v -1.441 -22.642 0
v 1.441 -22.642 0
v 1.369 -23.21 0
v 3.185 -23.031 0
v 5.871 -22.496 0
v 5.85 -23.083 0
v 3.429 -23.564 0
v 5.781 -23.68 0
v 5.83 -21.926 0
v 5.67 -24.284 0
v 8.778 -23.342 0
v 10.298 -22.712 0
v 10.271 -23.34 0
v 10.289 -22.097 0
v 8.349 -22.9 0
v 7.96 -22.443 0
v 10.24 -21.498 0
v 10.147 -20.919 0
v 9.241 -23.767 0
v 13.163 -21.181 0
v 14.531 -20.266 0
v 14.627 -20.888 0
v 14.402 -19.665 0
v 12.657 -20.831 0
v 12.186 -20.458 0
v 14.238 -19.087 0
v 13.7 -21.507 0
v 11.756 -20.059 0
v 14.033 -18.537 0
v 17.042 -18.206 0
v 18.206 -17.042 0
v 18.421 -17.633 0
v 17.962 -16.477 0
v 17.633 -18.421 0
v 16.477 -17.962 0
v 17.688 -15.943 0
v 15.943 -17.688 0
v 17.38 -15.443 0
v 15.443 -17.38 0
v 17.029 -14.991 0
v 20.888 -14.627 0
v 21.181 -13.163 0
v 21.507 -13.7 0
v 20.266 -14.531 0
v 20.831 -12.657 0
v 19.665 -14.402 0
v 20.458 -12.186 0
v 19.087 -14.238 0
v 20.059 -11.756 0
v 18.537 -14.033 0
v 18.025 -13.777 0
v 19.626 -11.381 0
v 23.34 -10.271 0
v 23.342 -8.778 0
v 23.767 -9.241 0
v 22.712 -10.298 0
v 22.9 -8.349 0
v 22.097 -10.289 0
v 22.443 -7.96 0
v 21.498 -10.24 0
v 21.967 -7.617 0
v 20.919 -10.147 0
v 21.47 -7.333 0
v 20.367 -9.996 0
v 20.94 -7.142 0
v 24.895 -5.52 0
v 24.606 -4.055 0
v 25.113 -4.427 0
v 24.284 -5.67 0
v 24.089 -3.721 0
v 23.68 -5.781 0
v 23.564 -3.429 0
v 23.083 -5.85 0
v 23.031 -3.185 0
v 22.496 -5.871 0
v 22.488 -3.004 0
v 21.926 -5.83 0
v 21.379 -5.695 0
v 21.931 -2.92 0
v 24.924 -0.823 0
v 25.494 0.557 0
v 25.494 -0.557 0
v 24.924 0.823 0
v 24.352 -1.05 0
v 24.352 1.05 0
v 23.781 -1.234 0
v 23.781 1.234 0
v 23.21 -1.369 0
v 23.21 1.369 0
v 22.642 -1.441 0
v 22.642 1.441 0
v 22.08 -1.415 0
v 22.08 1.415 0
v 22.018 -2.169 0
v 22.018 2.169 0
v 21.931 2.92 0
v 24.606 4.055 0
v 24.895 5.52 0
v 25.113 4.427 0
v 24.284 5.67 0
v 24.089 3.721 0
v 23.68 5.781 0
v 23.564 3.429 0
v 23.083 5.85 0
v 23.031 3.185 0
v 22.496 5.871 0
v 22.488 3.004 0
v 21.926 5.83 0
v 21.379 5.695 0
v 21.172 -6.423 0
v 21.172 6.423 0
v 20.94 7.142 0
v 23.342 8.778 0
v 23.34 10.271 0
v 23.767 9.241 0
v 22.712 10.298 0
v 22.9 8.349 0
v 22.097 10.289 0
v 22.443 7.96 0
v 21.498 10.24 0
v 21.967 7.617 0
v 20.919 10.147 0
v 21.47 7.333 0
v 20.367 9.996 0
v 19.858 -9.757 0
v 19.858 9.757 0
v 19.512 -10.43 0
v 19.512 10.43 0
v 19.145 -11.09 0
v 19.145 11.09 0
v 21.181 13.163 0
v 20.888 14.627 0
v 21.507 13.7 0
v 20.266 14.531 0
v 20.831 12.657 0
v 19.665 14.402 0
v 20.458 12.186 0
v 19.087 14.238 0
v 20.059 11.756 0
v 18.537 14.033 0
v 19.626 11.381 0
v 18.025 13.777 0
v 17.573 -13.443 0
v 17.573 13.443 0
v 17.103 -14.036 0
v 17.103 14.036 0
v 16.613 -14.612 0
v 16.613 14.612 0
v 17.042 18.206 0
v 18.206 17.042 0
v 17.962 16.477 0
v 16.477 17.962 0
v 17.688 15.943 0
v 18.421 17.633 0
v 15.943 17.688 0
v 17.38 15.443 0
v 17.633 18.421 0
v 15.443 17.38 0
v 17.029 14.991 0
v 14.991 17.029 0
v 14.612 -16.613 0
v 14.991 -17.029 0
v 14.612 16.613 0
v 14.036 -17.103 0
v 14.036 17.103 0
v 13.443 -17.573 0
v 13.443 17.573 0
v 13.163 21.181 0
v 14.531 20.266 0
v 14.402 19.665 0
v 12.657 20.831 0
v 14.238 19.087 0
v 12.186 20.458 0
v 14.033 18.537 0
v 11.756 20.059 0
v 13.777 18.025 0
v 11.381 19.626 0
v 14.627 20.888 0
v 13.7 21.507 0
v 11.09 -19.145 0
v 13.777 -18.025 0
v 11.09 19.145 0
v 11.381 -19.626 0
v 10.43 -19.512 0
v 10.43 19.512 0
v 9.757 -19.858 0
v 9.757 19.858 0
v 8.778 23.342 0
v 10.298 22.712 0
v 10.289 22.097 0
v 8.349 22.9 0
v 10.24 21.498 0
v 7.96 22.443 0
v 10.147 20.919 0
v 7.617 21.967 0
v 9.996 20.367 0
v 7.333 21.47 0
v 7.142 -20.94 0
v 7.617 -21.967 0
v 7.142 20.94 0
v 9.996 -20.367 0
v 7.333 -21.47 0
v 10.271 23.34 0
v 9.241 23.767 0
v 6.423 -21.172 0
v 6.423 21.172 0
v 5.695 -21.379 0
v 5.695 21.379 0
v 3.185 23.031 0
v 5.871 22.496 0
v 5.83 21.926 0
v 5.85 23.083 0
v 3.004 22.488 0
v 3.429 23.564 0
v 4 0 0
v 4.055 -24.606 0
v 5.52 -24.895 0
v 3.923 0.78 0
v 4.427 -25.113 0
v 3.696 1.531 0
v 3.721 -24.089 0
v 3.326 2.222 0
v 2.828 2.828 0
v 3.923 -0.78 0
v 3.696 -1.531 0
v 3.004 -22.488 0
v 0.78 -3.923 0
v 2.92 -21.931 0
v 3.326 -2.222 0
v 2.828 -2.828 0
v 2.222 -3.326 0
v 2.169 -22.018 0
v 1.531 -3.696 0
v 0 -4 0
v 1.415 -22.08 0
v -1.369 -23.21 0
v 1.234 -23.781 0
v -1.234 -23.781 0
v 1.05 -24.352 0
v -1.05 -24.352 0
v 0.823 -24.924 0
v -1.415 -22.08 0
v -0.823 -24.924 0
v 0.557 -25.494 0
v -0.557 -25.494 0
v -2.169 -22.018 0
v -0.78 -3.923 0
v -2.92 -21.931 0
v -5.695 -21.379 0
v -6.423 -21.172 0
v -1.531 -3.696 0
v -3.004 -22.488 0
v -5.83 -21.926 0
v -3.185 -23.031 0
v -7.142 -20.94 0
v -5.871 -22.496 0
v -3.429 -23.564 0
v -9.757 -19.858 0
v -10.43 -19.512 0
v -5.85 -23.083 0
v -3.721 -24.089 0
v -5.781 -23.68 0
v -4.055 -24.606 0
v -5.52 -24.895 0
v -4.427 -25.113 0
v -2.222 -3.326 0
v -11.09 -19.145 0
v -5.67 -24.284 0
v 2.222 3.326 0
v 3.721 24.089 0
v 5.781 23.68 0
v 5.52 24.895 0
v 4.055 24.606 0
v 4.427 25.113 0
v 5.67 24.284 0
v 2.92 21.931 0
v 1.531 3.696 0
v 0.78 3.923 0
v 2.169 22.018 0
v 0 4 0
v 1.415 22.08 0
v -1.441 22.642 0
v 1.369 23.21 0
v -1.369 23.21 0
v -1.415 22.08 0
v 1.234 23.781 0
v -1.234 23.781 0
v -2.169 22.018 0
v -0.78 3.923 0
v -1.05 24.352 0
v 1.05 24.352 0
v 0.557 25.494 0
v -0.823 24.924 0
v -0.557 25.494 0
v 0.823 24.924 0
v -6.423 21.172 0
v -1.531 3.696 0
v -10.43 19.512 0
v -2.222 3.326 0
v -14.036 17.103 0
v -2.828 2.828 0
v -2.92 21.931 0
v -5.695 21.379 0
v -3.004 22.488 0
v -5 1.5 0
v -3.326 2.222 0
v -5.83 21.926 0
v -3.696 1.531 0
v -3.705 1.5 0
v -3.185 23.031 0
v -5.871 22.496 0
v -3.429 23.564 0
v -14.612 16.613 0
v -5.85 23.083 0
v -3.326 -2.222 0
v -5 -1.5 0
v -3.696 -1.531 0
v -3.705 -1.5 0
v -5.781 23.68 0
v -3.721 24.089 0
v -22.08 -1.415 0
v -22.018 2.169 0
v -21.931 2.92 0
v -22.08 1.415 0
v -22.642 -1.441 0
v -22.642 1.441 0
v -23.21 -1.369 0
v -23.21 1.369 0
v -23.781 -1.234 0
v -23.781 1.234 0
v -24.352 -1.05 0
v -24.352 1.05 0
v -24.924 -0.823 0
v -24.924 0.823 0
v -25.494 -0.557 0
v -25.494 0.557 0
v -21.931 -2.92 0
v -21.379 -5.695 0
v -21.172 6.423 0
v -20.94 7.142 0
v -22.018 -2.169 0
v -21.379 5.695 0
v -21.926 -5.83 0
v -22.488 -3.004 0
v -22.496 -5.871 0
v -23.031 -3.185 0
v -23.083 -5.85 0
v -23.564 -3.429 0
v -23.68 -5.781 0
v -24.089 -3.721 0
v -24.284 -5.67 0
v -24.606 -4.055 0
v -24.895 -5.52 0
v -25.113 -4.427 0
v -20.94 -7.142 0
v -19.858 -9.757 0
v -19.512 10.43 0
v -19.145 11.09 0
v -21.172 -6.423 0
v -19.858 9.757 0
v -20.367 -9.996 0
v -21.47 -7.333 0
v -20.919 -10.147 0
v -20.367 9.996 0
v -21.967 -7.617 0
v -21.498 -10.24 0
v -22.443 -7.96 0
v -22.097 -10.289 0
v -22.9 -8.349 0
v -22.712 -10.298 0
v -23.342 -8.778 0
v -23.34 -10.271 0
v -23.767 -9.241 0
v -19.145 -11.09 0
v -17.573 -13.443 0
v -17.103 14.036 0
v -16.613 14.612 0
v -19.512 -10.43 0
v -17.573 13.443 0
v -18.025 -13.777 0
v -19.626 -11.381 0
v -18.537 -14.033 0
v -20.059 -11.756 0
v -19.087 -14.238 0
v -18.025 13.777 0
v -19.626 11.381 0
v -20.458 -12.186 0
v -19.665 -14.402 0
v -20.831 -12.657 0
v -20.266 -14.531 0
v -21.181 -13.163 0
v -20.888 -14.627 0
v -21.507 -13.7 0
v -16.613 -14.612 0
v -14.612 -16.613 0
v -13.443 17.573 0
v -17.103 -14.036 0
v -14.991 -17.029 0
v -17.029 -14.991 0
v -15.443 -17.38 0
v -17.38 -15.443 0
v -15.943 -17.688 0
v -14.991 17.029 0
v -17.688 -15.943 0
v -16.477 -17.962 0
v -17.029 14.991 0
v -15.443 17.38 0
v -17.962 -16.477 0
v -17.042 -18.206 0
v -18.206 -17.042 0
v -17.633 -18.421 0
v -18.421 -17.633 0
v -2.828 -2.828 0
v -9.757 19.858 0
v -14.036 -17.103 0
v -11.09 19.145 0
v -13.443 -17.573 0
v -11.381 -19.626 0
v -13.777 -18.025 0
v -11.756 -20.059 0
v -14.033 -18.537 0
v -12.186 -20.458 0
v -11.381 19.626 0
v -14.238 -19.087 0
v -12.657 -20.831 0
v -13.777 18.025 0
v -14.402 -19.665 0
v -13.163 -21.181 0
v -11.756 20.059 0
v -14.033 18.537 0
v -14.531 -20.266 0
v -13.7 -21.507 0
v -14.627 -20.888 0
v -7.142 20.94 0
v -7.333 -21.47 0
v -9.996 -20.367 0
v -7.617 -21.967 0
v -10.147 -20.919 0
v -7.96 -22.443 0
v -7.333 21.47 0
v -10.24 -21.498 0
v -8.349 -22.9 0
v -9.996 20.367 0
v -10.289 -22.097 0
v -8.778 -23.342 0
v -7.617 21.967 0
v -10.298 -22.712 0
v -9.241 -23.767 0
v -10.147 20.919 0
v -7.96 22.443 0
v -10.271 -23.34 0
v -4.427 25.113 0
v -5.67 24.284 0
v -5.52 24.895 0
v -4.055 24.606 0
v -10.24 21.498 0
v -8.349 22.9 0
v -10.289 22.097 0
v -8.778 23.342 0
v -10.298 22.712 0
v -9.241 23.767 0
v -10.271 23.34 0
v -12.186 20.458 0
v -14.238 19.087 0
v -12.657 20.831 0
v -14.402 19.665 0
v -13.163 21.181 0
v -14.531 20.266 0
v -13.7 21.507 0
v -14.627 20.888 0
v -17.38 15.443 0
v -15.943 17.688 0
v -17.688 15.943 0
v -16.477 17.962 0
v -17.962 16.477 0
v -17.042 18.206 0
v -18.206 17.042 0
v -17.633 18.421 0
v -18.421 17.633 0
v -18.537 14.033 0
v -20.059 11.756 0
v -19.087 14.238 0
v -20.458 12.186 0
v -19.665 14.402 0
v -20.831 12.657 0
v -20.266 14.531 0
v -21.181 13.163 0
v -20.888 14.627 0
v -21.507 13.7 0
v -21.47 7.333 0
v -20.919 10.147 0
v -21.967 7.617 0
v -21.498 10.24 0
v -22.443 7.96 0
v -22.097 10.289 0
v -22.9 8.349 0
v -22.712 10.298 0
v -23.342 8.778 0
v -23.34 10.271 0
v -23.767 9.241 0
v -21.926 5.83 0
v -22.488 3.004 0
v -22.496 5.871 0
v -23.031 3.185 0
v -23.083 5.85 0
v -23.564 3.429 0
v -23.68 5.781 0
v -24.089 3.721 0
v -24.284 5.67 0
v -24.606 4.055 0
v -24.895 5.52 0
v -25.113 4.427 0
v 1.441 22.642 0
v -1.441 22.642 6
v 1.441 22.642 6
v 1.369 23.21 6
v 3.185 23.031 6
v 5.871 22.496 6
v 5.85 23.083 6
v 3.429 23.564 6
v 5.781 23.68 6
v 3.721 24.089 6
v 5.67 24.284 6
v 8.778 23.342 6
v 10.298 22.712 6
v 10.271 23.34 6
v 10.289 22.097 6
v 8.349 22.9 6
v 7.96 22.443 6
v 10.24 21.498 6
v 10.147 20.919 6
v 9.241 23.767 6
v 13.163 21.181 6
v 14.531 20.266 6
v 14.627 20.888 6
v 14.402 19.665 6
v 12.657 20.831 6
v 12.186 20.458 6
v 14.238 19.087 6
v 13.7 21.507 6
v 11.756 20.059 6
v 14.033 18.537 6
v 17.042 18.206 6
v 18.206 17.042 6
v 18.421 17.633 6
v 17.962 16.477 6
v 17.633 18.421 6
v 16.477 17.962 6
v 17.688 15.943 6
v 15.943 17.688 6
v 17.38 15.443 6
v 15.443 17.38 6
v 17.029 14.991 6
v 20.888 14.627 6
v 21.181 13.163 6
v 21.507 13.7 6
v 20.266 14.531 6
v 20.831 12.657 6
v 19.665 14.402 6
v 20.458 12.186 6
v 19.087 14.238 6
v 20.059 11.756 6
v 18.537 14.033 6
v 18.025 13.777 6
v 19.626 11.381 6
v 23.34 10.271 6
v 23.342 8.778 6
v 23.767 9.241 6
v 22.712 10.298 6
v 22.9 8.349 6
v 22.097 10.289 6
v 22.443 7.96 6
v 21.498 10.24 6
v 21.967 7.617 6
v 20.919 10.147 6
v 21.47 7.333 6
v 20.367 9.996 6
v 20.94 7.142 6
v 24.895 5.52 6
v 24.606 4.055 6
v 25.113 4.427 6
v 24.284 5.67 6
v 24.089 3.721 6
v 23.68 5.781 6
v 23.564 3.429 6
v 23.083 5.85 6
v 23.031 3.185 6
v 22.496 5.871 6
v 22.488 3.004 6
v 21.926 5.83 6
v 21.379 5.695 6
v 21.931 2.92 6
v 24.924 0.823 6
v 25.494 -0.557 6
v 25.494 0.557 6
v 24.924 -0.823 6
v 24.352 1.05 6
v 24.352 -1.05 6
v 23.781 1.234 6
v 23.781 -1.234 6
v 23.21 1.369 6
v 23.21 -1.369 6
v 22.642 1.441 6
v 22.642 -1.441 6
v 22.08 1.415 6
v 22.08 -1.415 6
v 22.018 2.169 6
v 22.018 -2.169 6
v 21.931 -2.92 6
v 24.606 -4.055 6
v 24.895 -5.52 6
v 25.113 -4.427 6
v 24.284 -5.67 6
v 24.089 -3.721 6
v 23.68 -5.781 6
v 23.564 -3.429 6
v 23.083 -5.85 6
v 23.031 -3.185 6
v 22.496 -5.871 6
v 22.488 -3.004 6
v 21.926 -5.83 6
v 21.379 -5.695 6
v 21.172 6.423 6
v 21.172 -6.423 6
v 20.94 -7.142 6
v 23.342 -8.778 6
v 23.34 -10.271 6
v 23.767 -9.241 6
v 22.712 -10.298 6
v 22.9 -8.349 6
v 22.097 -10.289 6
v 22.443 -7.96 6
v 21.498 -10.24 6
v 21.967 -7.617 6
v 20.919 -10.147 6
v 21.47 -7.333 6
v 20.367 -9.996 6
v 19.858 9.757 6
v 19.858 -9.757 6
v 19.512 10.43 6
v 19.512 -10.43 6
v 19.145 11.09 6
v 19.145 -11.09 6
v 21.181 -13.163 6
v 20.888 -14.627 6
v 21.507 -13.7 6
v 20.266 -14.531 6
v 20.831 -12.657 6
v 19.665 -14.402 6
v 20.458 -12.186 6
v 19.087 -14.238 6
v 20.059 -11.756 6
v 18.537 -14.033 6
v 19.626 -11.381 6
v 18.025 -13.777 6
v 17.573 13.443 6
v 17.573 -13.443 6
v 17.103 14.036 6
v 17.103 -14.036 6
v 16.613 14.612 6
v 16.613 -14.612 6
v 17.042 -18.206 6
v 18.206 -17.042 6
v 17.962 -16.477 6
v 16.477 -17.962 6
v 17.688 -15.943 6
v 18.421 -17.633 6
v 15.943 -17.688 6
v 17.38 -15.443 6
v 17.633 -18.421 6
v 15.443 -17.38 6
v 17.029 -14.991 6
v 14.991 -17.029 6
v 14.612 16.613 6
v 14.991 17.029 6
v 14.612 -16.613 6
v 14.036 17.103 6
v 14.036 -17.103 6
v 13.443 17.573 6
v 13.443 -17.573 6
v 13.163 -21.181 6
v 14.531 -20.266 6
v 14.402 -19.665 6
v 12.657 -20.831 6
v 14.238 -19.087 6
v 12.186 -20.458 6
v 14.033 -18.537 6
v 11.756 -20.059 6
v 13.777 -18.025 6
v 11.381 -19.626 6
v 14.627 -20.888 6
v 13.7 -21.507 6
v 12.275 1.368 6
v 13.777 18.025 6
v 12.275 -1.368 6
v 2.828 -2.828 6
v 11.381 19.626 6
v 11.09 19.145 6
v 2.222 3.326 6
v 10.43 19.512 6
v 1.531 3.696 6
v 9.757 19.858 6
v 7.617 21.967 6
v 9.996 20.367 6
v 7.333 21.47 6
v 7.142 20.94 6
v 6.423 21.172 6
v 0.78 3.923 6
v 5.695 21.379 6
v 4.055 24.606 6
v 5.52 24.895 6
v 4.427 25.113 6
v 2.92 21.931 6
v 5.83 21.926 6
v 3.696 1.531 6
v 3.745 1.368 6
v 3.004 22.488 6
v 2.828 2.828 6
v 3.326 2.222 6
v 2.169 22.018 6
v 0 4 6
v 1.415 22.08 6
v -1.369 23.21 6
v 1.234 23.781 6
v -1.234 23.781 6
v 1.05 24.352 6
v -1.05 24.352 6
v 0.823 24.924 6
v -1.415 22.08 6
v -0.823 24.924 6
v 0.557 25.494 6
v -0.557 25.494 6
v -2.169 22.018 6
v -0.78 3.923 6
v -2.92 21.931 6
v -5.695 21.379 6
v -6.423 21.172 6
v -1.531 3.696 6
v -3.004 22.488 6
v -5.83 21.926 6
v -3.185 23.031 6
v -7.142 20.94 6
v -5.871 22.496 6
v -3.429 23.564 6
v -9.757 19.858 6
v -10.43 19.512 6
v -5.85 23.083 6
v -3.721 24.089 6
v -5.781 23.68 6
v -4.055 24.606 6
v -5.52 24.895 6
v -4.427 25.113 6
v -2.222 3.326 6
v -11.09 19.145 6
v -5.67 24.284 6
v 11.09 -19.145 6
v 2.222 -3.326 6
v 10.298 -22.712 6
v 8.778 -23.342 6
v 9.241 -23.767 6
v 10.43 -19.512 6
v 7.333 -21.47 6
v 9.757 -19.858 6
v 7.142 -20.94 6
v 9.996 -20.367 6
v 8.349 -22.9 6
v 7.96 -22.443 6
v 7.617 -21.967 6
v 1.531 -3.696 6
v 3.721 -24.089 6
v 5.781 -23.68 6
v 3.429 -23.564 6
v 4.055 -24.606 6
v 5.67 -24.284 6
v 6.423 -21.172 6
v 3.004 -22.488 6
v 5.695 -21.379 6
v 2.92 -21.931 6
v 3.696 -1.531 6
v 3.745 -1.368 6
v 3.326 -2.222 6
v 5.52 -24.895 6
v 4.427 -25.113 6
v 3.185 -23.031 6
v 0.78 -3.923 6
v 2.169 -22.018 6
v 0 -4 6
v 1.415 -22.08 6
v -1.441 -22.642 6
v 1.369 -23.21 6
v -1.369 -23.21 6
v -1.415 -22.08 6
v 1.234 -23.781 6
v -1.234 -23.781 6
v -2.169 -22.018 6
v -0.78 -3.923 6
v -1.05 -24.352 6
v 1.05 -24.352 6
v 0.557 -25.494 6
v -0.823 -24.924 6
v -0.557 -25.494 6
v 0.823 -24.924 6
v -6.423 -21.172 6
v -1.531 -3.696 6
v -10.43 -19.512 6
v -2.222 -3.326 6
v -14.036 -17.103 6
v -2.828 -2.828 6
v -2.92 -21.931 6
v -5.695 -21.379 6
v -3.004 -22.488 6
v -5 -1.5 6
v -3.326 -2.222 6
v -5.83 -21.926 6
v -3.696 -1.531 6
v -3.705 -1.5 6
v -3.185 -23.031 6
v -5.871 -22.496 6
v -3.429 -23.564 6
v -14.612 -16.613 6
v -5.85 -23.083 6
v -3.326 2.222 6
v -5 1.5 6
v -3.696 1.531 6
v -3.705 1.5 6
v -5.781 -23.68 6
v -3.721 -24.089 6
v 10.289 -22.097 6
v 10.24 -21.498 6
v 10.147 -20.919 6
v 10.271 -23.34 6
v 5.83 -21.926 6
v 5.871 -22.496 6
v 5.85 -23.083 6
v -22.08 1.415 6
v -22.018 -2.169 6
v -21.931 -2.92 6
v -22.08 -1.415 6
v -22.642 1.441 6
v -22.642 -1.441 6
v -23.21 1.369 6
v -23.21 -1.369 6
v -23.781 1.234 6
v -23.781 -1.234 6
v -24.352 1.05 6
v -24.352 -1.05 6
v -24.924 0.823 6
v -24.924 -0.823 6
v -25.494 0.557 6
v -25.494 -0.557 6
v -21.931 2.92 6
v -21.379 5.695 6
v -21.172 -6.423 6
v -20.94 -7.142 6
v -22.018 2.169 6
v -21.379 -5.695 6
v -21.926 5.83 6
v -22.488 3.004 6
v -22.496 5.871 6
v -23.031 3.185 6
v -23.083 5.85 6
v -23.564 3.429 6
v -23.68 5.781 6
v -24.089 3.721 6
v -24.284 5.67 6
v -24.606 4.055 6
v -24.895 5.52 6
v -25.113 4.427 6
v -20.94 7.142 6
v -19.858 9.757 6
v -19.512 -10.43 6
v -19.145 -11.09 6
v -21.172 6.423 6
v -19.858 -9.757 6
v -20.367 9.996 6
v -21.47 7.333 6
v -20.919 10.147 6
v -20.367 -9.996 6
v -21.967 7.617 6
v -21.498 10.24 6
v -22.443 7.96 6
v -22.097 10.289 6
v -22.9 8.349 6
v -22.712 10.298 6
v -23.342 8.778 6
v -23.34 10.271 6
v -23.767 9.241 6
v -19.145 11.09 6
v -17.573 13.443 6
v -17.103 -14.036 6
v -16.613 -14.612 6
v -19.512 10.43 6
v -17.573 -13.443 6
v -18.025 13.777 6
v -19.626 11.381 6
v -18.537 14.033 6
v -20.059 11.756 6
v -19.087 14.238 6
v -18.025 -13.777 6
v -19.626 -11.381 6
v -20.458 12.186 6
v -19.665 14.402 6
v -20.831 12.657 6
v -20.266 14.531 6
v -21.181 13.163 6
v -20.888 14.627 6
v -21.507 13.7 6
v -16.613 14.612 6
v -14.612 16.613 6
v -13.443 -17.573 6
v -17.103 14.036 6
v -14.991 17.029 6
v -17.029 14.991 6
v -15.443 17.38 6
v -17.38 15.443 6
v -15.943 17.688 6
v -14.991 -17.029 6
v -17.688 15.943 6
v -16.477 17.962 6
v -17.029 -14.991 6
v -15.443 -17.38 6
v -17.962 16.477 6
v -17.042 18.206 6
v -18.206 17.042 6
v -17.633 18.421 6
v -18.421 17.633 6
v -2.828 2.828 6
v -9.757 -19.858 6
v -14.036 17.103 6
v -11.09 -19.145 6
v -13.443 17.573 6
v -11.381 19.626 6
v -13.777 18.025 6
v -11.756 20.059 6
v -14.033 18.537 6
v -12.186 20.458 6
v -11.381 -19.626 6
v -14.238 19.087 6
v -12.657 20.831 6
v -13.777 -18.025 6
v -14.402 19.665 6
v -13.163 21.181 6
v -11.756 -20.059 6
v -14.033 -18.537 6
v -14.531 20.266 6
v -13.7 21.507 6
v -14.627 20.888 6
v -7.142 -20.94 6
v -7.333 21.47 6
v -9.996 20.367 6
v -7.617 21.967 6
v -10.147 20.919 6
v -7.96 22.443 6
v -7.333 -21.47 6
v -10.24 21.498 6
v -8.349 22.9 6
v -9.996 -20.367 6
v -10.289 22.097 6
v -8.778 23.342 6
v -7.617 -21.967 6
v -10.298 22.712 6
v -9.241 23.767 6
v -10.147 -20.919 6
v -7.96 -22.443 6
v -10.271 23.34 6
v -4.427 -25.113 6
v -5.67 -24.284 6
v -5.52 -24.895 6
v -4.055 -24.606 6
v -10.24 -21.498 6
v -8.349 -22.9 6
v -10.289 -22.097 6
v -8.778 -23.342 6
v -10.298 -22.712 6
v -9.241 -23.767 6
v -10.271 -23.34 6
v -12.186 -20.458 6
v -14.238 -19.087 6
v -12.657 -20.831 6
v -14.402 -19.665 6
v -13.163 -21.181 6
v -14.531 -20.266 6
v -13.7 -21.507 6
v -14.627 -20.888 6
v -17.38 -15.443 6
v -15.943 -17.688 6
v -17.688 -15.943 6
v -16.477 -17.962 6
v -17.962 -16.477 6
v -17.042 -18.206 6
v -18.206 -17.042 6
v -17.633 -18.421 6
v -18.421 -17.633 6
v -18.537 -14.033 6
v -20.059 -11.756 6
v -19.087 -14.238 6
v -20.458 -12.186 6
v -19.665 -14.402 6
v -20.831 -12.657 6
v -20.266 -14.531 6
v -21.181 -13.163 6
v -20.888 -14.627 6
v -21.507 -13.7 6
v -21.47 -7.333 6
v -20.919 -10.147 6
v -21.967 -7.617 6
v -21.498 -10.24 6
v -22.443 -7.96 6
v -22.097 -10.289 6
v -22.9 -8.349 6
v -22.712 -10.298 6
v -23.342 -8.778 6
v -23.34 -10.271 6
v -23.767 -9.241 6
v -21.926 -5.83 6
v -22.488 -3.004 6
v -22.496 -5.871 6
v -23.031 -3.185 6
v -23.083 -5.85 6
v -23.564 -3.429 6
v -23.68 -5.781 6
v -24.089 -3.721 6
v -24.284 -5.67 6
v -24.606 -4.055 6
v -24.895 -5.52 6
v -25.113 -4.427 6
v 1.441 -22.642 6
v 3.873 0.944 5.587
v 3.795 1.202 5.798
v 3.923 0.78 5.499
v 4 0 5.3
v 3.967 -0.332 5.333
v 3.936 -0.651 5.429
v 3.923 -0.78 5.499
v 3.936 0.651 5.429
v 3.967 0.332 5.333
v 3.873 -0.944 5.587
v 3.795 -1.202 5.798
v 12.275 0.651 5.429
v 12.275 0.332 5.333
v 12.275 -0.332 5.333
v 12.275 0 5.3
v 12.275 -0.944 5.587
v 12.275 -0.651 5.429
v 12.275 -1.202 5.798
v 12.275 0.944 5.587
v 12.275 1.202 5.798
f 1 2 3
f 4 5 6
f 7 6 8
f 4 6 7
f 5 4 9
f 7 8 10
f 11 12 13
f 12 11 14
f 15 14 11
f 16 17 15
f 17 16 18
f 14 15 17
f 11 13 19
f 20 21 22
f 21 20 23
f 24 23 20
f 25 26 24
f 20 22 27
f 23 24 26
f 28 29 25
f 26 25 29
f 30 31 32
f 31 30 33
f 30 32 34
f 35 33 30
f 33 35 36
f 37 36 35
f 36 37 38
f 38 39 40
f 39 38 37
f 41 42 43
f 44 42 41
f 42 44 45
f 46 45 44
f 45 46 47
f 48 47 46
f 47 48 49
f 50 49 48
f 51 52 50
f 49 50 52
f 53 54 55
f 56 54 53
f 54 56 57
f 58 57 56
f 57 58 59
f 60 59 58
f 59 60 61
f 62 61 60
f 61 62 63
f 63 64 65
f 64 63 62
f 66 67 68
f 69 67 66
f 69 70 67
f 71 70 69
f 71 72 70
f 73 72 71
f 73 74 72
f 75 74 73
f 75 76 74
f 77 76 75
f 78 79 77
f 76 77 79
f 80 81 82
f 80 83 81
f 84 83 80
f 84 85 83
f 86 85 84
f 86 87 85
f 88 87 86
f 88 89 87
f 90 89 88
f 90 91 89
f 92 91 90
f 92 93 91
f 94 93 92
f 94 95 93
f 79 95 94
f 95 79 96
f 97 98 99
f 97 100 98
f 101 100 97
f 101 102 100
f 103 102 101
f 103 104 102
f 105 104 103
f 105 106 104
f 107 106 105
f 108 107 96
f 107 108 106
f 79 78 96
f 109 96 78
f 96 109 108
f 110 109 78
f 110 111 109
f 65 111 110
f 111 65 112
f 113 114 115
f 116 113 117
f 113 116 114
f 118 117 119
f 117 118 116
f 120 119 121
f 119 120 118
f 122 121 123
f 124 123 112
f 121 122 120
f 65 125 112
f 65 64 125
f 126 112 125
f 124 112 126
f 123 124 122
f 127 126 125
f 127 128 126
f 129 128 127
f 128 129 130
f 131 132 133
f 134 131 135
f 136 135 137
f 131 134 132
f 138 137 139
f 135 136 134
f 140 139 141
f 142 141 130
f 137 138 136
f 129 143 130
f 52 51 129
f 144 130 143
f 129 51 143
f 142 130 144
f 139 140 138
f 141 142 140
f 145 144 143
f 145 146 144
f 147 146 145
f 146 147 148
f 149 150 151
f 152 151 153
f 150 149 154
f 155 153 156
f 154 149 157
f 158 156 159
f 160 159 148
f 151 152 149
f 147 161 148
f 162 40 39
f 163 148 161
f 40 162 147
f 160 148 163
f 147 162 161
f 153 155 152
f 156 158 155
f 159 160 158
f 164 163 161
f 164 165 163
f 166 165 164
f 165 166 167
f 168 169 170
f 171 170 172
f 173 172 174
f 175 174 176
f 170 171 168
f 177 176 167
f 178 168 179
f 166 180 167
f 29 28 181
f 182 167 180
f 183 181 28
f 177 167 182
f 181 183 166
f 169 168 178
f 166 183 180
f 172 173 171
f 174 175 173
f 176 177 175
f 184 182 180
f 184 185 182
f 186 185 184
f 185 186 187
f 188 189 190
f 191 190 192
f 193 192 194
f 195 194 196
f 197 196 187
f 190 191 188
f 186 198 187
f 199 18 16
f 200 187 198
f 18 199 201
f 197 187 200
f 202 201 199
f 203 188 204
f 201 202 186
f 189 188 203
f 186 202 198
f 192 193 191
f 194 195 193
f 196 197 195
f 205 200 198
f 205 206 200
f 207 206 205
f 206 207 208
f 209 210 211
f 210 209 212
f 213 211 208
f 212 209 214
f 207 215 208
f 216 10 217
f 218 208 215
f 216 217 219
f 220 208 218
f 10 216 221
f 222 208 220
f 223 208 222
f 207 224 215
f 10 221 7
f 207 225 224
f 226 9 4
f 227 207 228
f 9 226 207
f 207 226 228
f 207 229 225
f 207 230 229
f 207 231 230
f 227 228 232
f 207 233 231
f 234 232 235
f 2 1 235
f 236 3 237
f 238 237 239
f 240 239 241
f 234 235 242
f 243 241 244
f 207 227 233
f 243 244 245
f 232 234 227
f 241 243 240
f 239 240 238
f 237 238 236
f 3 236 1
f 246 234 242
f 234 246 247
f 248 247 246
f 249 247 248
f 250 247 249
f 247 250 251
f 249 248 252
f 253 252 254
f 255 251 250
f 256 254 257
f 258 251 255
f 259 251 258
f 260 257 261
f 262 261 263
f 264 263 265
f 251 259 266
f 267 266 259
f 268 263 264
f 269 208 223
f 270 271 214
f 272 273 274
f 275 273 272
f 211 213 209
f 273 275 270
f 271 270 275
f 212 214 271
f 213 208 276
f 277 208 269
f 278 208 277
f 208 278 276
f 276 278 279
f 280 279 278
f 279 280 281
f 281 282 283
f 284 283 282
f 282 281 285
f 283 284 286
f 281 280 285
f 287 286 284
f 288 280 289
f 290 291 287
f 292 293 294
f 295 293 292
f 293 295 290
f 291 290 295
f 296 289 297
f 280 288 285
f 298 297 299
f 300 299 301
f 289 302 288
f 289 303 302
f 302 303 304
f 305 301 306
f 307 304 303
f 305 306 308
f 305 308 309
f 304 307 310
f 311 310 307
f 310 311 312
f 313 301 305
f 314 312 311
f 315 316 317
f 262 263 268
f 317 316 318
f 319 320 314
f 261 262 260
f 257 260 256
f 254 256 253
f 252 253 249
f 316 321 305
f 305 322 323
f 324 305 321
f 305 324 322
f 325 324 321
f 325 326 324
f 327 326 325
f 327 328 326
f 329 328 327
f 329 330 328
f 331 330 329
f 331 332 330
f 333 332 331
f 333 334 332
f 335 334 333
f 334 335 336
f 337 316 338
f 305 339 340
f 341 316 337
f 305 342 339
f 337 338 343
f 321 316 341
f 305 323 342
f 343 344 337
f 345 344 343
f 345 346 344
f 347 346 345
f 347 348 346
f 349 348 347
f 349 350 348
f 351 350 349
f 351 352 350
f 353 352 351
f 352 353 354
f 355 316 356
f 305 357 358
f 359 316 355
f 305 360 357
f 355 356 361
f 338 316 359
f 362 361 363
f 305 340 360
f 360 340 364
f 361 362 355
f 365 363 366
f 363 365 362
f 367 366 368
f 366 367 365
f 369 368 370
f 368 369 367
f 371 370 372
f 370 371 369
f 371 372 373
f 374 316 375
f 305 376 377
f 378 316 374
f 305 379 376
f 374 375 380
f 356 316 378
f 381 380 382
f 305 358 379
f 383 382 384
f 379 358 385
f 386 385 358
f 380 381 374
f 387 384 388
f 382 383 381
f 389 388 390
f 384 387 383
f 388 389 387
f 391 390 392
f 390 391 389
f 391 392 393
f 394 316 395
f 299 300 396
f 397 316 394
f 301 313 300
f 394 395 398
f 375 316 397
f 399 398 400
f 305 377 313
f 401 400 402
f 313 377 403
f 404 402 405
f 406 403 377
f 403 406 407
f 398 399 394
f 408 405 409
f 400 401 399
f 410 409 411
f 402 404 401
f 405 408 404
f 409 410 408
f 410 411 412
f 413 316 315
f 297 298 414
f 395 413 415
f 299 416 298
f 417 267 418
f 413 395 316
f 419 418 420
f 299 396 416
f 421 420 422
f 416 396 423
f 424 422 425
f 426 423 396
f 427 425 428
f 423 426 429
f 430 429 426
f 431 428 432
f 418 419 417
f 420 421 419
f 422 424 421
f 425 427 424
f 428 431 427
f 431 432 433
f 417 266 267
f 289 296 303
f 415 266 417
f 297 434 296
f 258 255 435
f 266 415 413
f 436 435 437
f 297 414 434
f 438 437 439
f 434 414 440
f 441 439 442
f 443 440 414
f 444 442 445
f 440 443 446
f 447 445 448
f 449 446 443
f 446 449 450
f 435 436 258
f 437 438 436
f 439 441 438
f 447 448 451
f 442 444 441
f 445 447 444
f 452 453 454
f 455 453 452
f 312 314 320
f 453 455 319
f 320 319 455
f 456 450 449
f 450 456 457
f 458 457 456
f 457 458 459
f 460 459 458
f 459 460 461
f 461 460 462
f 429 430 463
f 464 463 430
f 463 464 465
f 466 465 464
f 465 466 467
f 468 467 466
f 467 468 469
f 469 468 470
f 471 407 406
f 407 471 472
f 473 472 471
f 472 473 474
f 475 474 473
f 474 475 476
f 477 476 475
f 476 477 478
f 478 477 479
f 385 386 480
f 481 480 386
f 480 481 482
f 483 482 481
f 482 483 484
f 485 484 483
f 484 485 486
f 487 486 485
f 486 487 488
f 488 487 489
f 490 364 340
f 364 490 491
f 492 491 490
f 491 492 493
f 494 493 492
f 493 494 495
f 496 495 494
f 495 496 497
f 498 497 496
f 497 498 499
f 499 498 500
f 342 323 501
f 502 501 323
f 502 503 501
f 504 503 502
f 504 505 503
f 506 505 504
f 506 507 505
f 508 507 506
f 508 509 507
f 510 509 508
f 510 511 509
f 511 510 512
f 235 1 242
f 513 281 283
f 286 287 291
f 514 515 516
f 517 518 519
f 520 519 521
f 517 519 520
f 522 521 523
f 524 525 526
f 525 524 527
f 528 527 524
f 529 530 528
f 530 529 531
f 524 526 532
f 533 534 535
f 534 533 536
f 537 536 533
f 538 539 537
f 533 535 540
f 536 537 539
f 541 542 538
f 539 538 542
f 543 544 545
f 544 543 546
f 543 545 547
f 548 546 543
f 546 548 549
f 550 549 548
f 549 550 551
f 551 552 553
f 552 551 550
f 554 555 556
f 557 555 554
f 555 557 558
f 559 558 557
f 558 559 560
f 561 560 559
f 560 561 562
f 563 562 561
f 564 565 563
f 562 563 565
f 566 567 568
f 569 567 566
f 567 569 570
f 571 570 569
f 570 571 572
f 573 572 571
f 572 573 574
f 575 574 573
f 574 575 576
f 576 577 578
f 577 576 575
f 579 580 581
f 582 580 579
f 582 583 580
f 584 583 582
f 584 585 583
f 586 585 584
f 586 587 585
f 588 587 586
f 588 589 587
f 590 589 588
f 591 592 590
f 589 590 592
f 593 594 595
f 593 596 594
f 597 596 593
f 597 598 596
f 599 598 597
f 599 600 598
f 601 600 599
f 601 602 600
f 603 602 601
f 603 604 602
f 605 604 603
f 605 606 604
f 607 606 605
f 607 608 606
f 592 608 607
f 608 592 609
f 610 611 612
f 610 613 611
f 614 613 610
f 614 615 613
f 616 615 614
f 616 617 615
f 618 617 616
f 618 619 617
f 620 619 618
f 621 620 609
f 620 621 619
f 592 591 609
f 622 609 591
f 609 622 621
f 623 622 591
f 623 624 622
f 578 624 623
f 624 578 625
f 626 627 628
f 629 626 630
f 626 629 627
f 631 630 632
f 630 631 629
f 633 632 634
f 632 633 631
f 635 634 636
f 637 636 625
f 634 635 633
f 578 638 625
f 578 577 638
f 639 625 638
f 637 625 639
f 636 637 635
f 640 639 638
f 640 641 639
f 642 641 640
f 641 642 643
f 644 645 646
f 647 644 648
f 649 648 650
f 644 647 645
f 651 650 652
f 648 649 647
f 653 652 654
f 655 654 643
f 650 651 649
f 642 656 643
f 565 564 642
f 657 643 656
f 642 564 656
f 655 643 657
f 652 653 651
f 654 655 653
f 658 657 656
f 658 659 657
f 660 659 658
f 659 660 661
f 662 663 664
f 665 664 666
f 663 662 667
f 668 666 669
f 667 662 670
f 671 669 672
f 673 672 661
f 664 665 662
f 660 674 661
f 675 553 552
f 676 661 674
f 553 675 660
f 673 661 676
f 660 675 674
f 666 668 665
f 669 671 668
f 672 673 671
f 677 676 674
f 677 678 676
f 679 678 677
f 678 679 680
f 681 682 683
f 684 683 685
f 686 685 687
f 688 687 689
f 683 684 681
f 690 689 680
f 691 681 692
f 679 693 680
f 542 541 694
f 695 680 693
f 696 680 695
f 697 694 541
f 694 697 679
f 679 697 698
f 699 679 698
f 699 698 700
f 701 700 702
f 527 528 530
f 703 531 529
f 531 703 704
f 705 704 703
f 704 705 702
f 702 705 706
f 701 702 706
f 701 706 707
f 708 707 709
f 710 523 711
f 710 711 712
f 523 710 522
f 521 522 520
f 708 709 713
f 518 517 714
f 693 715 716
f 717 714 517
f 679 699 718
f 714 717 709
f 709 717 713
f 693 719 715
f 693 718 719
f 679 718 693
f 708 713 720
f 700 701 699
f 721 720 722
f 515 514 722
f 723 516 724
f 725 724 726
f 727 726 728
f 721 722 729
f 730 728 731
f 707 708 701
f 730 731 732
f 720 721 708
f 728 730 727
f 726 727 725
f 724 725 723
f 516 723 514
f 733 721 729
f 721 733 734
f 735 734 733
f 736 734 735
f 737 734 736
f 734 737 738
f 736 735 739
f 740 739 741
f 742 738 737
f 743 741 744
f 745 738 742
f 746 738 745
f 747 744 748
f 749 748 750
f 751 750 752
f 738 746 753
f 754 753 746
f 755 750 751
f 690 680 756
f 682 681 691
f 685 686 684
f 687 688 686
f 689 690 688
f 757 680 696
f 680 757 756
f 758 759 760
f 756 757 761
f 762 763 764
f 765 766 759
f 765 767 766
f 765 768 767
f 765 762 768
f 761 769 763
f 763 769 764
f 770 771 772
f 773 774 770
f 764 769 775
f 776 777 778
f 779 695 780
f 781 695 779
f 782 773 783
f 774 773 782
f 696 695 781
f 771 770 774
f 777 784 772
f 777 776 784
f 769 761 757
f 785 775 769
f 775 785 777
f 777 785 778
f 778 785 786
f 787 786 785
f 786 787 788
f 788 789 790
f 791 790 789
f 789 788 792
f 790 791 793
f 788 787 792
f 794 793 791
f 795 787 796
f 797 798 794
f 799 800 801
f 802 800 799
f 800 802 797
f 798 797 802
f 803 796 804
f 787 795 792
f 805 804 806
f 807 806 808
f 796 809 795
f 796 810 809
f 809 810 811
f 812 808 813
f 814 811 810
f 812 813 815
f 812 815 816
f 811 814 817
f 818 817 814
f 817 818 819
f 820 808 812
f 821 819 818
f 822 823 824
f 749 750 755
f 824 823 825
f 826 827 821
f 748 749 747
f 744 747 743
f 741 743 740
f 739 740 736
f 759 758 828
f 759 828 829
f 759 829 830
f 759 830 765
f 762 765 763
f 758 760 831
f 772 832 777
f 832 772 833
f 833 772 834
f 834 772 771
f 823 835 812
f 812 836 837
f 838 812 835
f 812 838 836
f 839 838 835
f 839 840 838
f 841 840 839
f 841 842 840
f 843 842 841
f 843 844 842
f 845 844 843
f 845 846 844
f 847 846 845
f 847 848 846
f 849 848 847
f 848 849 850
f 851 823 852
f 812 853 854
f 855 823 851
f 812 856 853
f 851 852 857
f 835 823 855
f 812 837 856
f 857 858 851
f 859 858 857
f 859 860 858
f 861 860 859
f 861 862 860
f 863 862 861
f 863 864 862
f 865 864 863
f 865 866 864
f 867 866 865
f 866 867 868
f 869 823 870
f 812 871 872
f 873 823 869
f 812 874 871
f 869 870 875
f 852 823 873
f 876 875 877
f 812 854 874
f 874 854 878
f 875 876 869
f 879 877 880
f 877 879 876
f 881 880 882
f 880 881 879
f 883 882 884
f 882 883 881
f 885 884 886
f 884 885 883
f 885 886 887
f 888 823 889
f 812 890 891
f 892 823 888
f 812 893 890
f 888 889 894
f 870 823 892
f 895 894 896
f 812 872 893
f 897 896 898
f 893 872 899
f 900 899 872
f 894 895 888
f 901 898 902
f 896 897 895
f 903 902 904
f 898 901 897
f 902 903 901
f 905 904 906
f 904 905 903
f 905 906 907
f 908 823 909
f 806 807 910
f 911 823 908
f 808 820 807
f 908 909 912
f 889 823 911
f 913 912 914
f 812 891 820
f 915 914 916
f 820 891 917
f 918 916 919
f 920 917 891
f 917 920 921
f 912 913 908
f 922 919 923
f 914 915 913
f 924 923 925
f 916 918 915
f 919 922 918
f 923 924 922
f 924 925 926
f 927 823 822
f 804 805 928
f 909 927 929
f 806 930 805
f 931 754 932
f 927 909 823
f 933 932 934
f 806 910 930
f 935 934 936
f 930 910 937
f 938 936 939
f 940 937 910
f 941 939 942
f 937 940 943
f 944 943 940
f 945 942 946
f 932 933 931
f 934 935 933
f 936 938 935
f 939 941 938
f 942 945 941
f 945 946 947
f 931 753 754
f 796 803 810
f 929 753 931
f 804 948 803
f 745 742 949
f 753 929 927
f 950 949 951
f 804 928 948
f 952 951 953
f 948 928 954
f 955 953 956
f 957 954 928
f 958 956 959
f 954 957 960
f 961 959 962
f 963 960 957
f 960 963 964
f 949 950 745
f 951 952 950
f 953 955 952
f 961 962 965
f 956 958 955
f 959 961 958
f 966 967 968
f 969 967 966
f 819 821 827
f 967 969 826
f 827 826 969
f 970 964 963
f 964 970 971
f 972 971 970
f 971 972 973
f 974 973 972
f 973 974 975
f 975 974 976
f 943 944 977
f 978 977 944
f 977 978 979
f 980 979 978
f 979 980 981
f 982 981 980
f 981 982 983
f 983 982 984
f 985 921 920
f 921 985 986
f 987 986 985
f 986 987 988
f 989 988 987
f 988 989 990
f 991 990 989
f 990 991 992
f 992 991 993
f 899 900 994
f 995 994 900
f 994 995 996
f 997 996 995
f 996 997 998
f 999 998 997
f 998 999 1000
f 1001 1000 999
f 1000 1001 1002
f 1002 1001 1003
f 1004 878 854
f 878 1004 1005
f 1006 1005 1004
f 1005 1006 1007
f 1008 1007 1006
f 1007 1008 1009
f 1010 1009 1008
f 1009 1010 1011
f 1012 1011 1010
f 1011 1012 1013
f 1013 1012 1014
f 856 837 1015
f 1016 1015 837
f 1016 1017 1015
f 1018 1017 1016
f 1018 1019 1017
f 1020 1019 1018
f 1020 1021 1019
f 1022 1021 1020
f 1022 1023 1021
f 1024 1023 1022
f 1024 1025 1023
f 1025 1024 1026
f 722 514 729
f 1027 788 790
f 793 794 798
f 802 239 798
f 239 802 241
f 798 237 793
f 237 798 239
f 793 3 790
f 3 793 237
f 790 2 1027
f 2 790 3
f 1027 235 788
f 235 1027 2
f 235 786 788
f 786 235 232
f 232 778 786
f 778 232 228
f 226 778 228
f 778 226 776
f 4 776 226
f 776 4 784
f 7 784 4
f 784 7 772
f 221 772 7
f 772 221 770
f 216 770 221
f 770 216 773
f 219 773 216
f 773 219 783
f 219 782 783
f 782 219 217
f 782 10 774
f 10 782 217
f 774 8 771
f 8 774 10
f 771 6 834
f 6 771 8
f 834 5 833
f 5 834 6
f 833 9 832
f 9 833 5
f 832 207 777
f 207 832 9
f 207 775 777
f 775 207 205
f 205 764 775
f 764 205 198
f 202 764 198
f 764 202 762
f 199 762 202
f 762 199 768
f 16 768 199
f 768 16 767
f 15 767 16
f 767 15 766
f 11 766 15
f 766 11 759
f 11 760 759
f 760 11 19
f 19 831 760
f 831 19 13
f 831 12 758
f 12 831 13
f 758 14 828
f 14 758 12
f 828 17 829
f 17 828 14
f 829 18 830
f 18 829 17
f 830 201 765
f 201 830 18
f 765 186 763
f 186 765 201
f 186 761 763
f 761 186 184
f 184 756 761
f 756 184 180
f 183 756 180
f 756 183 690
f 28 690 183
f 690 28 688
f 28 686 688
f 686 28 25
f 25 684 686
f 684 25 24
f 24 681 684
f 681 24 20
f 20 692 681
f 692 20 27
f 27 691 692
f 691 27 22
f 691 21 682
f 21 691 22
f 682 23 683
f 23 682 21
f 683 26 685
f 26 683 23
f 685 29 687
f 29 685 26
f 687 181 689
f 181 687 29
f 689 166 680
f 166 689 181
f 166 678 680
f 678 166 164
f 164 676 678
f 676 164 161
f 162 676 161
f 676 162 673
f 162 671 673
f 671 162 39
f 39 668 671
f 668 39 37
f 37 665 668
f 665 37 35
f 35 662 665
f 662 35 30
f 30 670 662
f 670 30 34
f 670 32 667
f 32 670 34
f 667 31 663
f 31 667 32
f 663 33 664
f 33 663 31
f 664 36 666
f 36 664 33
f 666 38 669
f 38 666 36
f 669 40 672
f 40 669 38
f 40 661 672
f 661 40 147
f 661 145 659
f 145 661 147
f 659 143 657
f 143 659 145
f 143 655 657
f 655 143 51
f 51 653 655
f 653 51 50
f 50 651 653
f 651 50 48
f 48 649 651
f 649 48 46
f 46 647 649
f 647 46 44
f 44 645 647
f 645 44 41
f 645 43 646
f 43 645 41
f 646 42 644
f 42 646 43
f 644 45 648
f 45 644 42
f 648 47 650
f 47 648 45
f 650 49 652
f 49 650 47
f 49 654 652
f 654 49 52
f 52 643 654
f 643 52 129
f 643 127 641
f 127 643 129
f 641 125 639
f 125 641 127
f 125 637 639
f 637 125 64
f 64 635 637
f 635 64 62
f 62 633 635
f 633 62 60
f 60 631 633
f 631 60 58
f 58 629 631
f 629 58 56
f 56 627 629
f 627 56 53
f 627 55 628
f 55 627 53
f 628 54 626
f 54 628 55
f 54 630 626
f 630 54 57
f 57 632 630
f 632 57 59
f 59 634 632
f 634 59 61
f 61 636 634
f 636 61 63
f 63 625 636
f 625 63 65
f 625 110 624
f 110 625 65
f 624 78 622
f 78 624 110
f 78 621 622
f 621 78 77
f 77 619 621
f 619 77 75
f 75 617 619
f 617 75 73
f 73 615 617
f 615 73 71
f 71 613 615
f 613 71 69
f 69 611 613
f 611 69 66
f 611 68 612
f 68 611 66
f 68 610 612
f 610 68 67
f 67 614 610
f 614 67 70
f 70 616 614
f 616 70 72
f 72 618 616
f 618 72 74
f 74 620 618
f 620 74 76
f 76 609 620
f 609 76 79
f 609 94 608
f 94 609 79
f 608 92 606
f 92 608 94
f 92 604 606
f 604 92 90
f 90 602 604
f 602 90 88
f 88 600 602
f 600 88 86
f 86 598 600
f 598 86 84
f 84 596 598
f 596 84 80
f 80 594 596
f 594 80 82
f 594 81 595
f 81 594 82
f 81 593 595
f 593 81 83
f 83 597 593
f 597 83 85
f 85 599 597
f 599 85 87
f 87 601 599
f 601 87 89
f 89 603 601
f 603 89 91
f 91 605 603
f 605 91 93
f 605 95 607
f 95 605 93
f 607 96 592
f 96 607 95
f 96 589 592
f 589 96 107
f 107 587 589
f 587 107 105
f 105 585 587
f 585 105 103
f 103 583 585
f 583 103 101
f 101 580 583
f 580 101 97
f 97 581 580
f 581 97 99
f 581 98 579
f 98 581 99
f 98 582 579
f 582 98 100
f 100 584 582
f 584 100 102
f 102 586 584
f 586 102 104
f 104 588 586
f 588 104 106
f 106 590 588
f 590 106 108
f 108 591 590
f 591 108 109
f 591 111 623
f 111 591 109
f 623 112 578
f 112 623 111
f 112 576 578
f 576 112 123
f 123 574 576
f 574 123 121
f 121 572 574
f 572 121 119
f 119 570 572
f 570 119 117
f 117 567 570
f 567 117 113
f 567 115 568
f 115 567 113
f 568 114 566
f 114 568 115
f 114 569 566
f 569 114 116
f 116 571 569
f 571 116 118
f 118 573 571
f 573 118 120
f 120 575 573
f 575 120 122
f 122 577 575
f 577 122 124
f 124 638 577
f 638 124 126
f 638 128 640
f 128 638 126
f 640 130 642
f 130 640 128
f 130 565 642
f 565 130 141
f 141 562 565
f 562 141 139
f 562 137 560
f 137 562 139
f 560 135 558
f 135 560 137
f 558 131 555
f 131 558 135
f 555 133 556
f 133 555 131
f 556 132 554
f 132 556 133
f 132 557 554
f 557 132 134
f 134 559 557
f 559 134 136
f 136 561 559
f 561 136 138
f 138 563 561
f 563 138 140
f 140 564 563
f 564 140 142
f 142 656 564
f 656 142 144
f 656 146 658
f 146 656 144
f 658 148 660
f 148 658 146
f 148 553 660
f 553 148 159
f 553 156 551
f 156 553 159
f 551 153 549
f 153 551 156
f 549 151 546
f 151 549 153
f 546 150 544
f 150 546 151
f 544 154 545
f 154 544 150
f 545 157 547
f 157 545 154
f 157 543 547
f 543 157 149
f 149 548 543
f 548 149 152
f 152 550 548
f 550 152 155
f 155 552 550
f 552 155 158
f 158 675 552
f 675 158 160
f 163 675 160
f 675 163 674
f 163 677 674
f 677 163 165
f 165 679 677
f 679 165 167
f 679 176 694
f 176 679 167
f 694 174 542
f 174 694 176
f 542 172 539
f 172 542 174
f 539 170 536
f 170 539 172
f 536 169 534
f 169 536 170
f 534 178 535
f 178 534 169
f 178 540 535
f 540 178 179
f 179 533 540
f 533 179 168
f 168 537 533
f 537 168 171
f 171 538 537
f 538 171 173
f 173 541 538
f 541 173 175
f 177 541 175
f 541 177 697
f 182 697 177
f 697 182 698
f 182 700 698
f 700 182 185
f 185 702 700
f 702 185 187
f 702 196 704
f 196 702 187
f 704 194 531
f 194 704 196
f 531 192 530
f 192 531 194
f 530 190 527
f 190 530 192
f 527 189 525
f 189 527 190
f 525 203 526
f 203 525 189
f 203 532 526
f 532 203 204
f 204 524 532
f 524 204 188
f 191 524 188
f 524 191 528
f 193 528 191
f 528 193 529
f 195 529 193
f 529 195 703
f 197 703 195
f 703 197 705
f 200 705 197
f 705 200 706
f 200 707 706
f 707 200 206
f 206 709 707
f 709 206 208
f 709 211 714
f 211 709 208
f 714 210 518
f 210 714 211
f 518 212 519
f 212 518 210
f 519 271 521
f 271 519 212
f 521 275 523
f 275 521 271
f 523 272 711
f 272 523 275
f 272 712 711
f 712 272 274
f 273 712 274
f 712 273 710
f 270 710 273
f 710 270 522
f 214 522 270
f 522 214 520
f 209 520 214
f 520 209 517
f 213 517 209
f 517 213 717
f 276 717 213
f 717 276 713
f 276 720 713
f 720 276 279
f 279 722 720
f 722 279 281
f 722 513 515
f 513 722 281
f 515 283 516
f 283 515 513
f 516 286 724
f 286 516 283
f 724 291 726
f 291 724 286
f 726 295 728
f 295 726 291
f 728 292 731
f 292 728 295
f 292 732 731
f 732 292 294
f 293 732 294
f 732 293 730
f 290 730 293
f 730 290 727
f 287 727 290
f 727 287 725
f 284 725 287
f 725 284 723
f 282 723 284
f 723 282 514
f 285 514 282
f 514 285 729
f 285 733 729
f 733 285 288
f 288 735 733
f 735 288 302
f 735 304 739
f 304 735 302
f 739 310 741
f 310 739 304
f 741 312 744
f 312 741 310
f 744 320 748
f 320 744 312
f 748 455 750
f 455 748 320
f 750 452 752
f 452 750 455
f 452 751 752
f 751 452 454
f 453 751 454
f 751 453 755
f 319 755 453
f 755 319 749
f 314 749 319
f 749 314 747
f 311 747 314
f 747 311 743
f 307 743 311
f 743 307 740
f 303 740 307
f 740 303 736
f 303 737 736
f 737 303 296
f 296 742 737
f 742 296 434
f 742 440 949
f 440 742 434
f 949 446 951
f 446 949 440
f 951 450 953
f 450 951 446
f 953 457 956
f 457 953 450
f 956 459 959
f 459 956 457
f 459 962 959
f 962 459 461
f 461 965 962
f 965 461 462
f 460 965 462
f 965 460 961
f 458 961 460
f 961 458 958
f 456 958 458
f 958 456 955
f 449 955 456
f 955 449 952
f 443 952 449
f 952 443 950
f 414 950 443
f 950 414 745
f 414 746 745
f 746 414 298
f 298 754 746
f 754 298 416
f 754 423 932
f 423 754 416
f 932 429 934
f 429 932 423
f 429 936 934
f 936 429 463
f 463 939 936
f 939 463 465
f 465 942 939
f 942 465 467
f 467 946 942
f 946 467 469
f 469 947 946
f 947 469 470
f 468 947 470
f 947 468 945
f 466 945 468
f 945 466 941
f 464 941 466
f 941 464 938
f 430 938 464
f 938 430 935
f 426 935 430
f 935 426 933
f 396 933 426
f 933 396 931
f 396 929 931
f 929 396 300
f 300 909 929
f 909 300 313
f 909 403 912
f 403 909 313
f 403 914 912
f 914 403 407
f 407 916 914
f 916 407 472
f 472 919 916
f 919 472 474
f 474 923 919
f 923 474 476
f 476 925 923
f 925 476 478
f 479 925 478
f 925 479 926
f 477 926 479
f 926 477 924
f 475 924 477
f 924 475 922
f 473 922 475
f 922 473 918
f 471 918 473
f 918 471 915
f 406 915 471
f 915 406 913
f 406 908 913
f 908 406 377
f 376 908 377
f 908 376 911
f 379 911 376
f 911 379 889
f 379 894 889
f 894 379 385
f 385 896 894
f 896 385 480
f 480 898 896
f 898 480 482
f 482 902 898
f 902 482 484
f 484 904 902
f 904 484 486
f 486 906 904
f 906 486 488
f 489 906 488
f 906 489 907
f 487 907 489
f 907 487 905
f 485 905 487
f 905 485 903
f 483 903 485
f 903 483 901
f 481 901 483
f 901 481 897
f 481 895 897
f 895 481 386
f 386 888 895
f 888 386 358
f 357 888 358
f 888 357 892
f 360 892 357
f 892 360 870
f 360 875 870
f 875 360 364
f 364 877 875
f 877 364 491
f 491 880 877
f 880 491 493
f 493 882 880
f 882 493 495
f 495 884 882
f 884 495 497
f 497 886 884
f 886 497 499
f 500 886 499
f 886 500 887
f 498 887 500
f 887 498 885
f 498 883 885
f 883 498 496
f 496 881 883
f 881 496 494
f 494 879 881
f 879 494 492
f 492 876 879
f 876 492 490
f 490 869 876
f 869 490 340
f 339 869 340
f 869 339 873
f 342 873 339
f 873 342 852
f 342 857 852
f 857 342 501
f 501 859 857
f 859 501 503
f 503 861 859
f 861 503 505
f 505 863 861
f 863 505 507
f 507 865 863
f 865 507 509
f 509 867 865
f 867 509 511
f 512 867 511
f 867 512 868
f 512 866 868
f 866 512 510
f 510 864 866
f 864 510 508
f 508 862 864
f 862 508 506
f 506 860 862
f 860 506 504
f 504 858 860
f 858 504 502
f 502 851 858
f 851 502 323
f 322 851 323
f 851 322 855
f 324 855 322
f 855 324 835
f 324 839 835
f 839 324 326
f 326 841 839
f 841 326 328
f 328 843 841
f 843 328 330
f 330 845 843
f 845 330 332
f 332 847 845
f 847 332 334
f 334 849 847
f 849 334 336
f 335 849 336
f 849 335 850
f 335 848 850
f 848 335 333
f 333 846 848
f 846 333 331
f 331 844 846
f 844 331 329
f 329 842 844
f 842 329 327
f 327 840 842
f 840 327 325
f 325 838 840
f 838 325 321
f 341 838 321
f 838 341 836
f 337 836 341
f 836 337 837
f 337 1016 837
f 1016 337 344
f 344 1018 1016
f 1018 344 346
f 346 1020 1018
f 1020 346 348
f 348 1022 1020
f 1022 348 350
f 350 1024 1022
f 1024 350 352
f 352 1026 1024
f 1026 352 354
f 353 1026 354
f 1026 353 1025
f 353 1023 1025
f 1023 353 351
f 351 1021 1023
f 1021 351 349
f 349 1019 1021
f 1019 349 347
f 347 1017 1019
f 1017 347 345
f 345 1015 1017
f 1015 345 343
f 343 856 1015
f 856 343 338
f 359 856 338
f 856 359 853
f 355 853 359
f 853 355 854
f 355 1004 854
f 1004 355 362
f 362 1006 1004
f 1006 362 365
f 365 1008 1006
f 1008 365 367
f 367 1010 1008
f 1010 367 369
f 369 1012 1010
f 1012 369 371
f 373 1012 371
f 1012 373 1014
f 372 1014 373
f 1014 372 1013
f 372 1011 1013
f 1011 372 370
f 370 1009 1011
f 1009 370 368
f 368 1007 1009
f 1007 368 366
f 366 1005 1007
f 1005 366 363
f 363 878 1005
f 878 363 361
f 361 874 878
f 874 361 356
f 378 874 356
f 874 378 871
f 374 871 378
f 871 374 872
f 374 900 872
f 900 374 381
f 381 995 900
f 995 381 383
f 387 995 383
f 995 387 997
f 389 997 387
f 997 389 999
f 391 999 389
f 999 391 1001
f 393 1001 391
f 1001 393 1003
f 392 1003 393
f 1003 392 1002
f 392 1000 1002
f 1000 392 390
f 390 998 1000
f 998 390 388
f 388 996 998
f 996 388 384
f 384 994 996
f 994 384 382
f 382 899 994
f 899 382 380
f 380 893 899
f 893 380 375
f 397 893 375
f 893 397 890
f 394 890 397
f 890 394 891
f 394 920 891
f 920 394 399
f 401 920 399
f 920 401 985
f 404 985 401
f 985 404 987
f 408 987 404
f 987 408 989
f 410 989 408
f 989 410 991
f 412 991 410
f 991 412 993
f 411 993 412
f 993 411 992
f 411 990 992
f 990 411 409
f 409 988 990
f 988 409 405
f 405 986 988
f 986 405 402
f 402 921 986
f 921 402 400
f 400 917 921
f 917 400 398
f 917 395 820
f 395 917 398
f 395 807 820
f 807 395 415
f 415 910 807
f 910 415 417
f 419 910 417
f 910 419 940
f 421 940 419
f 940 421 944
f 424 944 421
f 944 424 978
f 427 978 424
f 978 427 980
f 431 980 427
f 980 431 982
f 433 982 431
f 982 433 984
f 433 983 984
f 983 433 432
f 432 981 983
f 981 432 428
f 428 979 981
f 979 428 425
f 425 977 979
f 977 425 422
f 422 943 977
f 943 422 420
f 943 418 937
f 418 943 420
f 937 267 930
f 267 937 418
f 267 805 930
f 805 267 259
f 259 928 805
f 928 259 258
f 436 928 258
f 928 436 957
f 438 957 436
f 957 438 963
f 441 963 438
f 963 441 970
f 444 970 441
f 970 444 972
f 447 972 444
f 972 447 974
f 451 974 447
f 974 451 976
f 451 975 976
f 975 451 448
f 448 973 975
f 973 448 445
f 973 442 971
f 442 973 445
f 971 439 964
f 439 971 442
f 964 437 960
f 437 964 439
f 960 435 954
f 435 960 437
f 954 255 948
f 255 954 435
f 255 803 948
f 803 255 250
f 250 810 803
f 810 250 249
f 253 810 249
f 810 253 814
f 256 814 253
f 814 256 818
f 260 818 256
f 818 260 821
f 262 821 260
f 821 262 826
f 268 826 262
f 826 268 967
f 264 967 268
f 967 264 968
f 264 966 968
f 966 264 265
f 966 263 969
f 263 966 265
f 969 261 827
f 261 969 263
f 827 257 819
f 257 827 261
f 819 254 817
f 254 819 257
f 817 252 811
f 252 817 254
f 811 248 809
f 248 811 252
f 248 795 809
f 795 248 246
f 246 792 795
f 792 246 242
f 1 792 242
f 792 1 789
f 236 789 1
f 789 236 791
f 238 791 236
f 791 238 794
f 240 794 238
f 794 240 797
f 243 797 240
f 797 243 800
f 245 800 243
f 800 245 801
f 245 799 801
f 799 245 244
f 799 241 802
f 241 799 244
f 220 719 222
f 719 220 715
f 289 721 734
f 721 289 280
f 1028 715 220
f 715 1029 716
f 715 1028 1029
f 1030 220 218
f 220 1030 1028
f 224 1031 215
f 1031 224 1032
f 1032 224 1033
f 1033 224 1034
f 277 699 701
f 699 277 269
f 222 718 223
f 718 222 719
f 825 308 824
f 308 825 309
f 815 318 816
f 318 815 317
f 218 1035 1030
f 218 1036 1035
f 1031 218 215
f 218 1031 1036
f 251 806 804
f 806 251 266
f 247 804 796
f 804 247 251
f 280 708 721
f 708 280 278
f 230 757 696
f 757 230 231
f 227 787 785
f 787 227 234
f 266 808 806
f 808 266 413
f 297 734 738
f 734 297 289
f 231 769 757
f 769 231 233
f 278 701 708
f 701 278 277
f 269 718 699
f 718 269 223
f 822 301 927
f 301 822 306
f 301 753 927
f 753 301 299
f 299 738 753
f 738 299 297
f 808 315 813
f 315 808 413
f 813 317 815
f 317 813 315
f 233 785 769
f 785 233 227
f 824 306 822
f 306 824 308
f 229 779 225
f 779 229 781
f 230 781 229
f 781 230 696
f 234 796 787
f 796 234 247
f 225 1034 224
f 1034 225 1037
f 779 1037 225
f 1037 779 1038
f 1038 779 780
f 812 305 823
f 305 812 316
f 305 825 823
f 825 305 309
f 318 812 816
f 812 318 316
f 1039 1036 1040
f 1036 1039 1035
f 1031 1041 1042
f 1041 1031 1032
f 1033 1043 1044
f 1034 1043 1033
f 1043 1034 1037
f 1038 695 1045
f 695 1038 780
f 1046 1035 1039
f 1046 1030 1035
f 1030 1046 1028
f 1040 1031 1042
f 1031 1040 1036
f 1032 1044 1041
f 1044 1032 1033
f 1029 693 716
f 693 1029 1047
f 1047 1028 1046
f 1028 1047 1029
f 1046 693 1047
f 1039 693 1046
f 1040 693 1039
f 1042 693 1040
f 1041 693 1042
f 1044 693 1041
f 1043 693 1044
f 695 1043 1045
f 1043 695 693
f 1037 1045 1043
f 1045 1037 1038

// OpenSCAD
$fn = 32;

// ----------------------------------------------------------------------
// Spur gear: m=1.5 z=32, 51 mm tip diameter x 6 mm
// ----------------------------------------------------------------------

// --- parameters (mm) ---
module_m = 1.5;           // module
teeth = 32;               // number of teeth
face_w = 6;               // face width
pa = 20;                  // pressure angle, deg
bore_d = 8;               // shaft bore
key_w = 3;                // keyway width
key_h = 1.4;              // keyway depth
set_d = 3.4;              // set screw tap hole
set_z = 7;                // set screw height

/* --- involute profile --- */
pitch_r = module_m * teeth / 2;
base_r = pitch_r * cos(pa);
tip_r = pitch_r + module_m;
root_r = pitch_r - 1.25 * module_m;
flank_steps = 6;

function inv_deg(a) = (tan(a) - a * PI / 180) * 180 / PI;
function flank_r(i) = root_r + (tip_r - root_r) * i / flank_steps;
function half_angle(r) = 90 / teeth + inv_deg(pa) - inv_deg(acos(min(1, base_r / r)));
function tooth_pt(k, i, side) =
    let (r = flank_r(i), a = k * 360 / teeth + side * half_angle(r))
    [r * cos(a), r * sin(a)];

module tooth_profile() {
  polygon(points = [
    for (k = [0 : teeth - 1])
      each [
        for (i = [0 : flank_steps]) tooth_pt(k, i, -1),
        for (i = [flank_steps : -1 : 0]) tooth_pt(k, i, 1),
        let (ta = (k + 0.5) * 360 / teeth)
          [root_r * cos(ta), root_r * sin(ta)]
      ]
  ]);
}

module gear_disc() {
  linear_extrude(height = face_w) tooth_profile();
}

difference() {
  gear_disc();
  translate([0, 0, -1]) cylinder(h = face_w + 3, d = bore_d);
  /* keyway on the bore */
  translate([-bore_d / 2 - 1, -key_w / 2, -1]) cube([key_h + 1, key_w, face_w + 3]);
  /* set screw, drilled radially */
  translate([-1, 0, set_z]) rotate([0, 90, 0]) cylinder(h = (root_r * 0.6), d = set_d);
}
